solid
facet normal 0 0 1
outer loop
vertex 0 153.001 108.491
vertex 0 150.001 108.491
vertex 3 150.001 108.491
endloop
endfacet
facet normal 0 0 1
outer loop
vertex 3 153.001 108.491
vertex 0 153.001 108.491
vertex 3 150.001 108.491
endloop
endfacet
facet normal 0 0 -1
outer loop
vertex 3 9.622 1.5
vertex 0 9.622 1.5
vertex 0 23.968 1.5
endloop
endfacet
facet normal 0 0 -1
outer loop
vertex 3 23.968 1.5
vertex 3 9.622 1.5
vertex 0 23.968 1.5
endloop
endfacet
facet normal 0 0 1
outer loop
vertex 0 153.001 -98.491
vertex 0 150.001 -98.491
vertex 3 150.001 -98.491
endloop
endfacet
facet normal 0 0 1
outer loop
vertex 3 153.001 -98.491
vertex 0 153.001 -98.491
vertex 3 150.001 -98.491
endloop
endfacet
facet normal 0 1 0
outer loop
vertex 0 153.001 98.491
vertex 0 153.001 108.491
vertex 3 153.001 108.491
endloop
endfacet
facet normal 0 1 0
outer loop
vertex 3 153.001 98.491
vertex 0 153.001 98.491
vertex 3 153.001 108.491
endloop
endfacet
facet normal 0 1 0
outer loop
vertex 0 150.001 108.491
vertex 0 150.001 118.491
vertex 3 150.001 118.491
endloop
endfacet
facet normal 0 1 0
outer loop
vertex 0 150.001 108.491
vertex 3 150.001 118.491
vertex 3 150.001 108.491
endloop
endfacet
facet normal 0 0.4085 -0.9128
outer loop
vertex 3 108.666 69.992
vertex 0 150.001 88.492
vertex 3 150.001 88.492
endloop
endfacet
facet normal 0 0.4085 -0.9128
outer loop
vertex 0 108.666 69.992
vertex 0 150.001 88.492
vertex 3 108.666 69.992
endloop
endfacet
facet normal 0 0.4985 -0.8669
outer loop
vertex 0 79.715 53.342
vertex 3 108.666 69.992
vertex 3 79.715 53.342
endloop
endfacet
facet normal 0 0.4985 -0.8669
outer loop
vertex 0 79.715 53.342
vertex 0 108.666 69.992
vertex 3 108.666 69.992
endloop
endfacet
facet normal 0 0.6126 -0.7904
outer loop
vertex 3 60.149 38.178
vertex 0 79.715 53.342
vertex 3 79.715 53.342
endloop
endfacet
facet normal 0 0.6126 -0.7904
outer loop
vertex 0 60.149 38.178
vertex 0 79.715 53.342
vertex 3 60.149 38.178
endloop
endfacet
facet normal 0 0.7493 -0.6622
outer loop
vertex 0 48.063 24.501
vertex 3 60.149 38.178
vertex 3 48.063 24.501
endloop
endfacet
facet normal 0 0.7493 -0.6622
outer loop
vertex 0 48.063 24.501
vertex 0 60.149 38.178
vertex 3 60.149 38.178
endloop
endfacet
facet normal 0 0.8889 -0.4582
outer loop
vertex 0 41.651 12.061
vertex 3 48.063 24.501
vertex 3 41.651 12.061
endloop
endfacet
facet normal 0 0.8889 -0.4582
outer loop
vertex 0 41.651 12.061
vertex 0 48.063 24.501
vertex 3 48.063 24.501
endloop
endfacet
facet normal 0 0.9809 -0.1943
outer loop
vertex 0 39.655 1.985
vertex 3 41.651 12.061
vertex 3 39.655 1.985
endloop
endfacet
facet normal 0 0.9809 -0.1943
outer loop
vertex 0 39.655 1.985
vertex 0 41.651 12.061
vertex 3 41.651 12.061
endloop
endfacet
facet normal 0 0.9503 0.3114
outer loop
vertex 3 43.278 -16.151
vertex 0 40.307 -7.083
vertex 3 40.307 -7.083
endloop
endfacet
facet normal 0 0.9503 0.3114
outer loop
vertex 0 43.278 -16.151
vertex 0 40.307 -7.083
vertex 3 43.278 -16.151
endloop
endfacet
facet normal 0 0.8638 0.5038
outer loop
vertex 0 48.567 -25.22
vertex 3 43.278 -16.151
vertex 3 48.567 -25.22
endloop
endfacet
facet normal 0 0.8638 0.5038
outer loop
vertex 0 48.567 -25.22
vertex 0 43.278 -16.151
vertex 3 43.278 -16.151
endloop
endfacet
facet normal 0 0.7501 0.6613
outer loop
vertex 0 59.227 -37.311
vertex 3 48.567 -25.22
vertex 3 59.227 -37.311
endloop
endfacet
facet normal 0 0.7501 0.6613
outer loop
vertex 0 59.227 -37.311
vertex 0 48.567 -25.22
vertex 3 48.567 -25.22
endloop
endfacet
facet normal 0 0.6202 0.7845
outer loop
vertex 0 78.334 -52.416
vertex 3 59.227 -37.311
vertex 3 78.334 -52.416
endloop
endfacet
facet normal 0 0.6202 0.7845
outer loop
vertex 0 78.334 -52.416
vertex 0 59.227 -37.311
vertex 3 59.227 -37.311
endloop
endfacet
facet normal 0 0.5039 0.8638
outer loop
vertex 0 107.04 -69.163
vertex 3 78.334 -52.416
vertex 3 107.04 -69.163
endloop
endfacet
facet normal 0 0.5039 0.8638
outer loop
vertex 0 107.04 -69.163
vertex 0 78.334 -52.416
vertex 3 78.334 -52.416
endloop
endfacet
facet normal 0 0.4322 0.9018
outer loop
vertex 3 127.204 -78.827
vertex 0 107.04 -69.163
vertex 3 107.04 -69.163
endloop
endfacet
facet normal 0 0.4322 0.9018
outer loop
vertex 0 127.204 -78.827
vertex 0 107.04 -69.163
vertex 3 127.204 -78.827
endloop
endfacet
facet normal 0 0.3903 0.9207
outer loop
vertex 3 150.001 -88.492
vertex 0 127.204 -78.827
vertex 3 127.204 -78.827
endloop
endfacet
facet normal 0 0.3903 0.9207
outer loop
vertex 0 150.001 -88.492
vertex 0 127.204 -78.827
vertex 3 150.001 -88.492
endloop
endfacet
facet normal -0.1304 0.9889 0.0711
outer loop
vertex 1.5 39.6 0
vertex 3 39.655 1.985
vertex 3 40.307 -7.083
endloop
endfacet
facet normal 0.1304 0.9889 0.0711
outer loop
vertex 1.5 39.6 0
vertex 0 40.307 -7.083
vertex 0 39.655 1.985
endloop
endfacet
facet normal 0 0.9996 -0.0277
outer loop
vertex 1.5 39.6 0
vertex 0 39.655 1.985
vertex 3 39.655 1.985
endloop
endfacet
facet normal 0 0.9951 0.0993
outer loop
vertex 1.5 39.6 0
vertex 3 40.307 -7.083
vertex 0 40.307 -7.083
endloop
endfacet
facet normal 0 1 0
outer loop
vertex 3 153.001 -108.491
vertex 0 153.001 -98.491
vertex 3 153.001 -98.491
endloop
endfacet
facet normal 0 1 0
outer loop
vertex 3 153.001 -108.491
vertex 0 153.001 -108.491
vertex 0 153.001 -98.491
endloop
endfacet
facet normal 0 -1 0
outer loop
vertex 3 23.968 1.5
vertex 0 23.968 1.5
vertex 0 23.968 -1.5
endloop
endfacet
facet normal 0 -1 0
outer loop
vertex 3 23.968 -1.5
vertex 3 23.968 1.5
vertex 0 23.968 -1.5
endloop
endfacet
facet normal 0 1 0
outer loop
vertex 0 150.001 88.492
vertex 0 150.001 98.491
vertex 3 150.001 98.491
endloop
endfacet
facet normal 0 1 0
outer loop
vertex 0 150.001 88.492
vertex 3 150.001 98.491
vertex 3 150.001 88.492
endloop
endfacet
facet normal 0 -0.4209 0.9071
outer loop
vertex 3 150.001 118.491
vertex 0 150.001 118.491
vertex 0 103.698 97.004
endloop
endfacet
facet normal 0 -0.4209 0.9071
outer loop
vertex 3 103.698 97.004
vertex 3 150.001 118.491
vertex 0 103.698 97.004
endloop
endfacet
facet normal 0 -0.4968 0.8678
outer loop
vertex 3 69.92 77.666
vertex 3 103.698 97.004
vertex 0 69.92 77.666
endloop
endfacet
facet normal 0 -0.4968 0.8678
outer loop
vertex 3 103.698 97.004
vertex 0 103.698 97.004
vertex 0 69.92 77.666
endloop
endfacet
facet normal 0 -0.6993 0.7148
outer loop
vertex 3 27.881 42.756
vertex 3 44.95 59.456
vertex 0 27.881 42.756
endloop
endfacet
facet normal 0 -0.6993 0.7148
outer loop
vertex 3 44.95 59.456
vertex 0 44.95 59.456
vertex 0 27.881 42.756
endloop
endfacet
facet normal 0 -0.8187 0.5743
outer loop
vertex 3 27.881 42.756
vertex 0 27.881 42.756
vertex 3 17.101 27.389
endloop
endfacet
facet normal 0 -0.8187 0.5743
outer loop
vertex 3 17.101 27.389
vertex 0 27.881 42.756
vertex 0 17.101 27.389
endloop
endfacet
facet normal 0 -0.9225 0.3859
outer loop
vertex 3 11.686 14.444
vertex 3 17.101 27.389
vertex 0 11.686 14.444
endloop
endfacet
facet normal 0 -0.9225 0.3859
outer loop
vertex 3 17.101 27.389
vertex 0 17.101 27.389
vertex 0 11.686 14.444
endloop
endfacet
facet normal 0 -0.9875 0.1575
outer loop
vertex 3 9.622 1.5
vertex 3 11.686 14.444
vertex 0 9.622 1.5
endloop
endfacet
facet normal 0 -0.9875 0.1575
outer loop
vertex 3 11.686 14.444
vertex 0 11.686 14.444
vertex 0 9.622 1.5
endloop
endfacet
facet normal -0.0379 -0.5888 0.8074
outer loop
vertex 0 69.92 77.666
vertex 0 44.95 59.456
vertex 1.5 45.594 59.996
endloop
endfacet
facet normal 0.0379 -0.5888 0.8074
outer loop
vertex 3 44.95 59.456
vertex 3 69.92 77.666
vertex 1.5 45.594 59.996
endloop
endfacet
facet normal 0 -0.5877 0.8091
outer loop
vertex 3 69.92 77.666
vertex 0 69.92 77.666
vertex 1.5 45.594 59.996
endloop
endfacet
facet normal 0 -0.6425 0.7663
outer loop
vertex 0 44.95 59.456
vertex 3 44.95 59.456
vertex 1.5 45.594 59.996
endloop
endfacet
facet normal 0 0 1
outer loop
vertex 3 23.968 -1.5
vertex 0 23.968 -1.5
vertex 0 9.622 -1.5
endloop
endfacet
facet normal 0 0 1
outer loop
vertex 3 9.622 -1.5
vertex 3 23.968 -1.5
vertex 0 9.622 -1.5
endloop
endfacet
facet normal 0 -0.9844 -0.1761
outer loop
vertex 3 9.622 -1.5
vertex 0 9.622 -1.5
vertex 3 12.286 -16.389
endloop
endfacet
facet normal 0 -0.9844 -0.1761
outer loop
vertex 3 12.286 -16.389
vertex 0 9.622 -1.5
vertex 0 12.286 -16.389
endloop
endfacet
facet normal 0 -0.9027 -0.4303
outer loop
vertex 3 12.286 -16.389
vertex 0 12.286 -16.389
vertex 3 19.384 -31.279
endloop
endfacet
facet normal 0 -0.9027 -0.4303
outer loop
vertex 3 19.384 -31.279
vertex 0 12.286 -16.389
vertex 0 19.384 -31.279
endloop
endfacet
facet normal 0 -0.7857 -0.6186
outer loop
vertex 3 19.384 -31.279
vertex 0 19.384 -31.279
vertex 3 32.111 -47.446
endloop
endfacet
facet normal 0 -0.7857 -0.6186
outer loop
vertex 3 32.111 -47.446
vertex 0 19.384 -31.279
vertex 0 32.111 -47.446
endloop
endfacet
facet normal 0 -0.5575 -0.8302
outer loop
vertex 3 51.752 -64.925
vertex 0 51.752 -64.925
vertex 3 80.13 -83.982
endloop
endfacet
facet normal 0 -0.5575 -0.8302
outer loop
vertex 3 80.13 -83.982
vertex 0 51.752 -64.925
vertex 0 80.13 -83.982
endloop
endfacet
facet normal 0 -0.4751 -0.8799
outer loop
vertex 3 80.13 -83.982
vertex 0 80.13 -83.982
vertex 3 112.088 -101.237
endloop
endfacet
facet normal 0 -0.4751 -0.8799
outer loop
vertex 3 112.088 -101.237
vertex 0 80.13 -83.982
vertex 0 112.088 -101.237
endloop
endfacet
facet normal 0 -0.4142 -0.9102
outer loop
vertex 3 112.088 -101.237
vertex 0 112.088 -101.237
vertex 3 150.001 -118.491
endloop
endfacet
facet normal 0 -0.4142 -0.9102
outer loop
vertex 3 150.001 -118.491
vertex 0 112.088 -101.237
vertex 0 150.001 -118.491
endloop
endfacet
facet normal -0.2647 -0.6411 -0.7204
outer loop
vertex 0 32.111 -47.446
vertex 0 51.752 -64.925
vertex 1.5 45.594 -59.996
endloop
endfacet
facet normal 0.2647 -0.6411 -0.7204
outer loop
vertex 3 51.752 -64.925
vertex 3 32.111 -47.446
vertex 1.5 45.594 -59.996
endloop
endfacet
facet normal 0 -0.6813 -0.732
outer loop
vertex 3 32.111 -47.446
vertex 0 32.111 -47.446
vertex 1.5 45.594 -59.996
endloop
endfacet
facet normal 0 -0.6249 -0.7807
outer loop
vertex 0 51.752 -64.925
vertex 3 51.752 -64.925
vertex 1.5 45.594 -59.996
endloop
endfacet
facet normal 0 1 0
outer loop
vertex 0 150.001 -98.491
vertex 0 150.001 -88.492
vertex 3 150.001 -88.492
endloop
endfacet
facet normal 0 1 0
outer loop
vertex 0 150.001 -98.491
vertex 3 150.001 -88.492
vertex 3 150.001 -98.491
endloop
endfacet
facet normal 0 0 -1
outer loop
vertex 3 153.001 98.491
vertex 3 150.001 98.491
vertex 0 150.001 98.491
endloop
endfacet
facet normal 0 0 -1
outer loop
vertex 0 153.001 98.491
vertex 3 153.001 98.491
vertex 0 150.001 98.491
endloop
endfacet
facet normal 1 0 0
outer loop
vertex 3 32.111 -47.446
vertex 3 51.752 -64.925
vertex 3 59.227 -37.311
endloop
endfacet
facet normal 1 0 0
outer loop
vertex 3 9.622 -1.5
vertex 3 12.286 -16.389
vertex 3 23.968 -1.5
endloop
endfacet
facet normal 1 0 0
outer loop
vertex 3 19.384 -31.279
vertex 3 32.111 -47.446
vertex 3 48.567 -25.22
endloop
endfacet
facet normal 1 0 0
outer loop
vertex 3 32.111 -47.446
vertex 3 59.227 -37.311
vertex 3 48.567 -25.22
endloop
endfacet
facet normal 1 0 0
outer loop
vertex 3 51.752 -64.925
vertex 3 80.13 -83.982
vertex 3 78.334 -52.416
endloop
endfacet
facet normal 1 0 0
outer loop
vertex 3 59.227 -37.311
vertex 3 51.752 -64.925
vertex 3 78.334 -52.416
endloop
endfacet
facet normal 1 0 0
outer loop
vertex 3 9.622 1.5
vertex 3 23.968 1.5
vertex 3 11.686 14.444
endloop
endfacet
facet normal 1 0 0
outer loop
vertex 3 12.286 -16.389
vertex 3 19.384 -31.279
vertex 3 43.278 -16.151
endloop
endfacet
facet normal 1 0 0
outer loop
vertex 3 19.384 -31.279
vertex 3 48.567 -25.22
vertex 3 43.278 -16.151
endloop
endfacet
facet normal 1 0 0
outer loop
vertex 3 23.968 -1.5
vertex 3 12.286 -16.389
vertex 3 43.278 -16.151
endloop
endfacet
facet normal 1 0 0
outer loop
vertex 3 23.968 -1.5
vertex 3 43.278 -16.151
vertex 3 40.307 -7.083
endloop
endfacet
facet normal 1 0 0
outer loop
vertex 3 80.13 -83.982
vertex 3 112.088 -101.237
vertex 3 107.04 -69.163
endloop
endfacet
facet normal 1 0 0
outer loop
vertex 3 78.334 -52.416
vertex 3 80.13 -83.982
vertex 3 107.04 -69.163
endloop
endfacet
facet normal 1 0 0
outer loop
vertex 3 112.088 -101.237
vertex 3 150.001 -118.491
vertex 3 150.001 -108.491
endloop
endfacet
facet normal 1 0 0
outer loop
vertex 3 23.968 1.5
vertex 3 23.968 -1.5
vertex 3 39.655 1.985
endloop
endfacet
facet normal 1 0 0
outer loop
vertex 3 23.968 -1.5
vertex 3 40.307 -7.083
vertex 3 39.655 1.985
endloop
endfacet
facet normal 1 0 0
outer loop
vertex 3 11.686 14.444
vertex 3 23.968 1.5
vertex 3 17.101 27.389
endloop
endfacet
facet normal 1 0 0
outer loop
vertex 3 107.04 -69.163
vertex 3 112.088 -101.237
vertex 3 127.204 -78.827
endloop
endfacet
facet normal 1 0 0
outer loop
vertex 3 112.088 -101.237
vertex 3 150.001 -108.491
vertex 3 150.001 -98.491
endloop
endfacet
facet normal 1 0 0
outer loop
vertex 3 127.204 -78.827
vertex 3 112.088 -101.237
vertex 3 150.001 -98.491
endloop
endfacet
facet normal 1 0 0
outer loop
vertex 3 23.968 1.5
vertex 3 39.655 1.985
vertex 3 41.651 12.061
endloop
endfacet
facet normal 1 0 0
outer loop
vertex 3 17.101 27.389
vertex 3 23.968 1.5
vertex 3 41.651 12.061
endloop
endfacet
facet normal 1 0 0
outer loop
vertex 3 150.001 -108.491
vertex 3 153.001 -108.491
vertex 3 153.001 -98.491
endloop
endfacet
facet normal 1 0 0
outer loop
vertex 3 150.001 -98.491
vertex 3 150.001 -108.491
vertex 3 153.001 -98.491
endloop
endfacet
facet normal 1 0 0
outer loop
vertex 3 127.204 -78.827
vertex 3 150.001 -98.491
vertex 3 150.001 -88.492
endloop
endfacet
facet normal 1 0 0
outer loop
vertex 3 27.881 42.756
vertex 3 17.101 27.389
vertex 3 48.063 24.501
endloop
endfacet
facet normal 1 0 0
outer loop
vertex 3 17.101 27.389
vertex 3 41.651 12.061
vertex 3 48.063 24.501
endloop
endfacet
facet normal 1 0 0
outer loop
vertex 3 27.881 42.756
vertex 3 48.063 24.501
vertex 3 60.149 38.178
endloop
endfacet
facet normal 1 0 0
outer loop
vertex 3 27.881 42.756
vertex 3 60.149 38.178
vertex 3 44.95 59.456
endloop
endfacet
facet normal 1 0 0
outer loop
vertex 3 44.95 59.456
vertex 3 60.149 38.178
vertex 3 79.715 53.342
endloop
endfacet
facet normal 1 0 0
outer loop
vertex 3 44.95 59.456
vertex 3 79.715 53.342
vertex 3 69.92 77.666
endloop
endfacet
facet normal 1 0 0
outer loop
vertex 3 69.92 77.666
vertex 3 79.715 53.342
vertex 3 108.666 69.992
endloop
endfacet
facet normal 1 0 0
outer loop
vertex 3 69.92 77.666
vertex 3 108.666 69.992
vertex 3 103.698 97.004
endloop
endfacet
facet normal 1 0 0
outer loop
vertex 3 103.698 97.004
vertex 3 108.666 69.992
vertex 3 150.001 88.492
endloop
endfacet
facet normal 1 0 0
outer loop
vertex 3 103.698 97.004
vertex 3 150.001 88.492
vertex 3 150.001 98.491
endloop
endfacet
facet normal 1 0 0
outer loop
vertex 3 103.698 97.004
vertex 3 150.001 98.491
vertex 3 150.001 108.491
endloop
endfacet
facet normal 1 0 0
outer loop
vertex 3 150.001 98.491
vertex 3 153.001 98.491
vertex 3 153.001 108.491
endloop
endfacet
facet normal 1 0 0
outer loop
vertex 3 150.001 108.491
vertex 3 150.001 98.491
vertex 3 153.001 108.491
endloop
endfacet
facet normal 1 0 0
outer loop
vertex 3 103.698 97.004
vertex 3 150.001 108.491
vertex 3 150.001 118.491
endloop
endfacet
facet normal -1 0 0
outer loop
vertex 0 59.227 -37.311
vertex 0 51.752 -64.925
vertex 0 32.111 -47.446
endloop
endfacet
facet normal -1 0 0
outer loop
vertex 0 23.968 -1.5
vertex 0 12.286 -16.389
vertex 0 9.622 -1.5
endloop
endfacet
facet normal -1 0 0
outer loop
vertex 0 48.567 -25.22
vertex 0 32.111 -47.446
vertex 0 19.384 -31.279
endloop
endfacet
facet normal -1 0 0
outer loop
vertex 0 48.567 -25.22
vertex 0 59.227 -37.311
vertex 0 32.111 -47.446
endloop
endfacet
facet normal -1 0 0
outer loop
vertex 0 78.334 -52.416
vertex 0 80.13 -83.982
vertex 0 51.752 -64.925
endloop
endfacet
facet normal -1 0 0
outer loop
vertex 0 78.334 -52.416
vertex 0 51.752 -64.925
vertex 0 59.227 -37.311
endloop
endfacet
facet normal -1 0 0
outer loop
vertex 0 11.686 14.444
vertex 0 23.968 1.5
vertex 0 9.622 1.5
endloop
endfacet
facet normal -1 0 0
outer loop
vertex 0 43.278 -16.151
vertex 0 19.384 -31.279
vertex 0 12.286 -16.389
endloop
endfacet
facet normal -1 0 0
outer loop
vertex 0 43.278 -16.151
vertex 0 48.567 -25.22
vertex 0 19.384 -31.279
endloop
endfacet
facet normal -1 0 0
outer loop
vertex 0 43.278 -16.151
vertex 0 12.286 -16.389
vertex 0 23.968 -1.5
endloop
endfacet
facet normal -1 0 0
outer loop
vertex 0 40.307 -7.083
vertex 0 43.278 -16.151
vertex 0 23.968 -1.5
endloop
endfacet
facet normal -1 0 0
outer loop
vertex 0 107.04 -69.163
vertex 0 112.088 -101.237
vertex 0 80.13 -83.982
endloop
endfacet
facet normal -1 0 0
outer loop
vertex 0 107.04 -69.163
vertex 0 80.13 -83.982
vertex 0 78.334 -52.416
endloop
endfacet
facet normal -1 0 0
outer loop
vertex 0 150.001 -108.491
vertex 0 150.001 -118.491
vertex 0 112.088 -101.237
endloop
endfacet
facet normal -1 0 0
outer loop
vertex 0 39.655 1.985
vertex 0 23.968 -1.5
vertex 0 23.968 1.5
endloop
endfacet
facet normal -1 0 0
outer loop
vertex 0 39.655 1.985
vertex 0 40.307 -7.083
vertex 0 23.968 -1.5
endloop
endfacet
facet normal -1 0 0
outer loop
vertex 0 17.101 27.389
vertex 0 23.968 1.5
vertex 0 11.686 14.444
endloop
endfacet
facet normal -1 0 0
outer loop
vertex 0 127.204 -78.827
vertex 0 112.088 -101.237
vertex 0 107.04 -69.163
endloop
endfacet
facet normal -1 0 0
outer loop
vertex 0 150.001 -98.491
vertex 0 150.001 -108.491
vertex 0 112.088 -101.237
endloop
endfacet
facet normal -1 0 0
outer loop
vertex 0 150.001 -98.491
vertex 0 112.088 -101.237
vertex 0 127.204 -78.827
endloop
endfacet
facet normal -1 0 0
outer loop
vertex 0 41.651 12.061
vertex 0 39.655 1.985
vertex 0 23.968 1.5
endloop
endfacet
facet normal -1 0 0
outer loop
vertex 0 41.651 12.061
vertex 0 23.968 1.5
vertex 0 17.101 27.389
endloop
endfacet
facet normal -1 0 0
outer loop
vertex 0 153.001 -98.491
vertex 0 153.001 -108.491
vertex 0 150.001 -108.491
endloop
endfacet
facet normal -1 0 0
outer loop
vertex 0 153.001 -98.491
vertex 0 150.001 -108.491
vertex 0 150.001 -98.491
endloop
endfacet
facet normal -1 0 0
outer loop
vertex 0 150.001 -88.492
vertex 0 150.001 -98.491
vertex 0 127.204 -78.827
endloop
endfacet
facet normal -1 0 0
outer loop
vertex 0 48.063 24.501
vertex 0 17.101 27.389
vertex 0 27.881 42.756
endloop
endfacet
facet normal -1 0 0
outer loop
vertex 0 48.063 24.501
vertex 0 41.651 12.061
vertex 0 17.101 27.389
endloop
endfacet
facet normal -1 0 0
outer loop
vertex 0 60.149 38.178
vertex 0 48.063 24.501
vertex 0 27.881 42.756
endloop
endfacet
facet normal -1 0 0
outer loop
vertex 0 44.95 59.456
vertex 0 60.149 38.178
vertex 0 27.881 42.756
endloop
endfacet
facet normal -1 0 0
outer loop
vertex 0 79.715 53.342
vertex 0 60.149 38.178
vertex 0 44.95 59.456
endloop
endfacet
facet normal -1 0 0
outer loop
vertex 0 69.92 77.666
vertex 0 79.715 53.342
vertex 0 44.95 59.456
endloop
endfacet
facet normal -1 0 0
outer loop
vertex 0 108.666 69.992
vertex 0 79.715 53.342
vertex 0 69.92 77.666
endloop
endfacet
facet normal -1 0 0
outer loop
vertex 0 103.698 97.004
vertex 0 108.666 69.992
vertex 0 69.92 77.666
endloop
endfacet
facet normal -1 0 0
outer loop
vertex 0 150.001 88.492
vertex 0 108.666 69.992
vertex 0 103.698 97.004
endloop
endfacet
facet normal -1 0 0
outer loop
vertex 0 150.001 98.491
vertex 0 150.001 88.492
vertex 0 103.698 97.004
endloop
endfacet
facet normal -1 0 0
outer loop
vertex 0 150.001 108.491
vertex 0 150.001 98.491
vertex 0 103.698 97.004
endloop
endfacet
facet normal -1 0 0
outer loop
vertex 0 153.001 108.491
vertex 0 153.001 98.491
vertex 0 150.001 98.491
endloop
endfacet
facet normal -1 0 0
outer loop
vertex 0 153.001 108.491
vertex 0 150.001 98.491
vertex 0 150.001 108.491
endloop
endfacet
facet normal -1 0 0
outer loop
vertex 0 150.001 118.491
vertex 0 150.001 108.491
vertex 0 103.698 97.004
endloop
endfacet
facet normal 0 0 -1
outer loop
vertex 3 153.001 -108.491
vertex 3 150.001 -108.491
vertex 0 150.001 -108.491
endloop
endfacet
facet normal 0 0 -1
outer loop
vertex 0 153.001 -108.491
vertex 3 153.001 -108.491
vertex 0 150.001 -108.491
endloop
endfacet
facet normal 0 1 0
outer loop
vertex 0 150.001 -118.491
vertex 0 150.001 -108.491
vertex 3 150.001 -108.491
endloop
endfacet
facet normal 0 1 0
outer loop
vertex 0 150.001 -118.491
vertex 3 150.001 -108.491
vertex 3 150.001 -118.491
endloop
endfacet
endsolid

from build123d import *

# Parameters (mm, degrees)
EXTRUDE_1_DEPTH     = 3
EXTRUDE_2_DEPTH     = 3
CUT_EXTRUDE_1_DEPTH = 194.541958544


with BuildPart() as part:
    # 草图1 → 凸台-拉伸1 (new body)
    with BuildSketch(Plane(origin=(0, 0, 0), x_dir=(0, 0, -1), z_dir=(1, 0, 0))):
        with BuildLine():
            Line((-118.4910594, 150.001171578), (-88.491527969, 150.001171578))
            add(Edge.make_bspline(
                [(-88.491527969, 150.001171578), (0, -70.801451578), (88.491527969, 150.001171578)],
                knots=[0.163916292, 0.163916292, 0.163916292, 0.836083708, 0.836083708, 0.836083708], degree=2))
            Line((88.491527969, 150.001171578), (118.4910594, 150.001171578))
            add(Edge.make_bspline(
                [(-118.4910594, 150.001171578), (0, -130.801451578), (118.4910594, 150.001171578)],
                knots=[0.053698709, 0.053698709, 0.053698709, 0.946301291, 0.946301291, 0.946301291], degree=2))
        make_face()
    extrude(amount=EXTRUDE_1_DEPTH)

    # 草图2 → 凸台-拉伸2 (add)
    with BuildSketch(Plane(origin=(0, 150.001171578, 0), x_dir=(1, 0, 0), z_dir=(0, 1, 0))):
        Polygon((0, 98.491293685), (0.99999219, 98.491293685), (2.00000781, 108.491293685), (0, 108.491293685), align=None)
        Polygon((2.00000781, 108.491293685), (0.99999219, 98.491293685), (3, 98.491293685), (3, 108.491293685), align=None)
        Polygon((2.00000781, -98.491293685), (0.99999219, -108.491293685), (3, -108.491293685), (3, -98.491293685), align=None)
        Polygon((0, -108.491293685), (0.99999219, -108.491293685), (2.00000781, -98.491293685), (0, -98.491293685), align=None)
    extrude(amount=EXTRUDE_2_DEPTH)

    # 草图3 → 切除-拉伸1 (cut, through all)
    with BuildSketch(Plane.ZY):
        with BuildLine():
            Line((1.5, 23.967667099), (-1.5, 23.967667099))
            Line((-1.5, 23.967667099), (-1.5, 9.62236))
            add(Edge.make_bspline(
                [(-1.5, 9.62236), (0, 9.57736), (1.5, 9.62236)],
                knots=[0.49435019, 0.49435019, 0.49435019, 0.50564981, 0.50564981, 0.50564981], degree=2))
            Line((1.5, 9.62236), (1.5, 23.967667099))
        make_face()
    extrude(amount=-CUT_EXTRUDE_1_DEPTH, mode=Mode.SUBTRACT)


solid = part.part
